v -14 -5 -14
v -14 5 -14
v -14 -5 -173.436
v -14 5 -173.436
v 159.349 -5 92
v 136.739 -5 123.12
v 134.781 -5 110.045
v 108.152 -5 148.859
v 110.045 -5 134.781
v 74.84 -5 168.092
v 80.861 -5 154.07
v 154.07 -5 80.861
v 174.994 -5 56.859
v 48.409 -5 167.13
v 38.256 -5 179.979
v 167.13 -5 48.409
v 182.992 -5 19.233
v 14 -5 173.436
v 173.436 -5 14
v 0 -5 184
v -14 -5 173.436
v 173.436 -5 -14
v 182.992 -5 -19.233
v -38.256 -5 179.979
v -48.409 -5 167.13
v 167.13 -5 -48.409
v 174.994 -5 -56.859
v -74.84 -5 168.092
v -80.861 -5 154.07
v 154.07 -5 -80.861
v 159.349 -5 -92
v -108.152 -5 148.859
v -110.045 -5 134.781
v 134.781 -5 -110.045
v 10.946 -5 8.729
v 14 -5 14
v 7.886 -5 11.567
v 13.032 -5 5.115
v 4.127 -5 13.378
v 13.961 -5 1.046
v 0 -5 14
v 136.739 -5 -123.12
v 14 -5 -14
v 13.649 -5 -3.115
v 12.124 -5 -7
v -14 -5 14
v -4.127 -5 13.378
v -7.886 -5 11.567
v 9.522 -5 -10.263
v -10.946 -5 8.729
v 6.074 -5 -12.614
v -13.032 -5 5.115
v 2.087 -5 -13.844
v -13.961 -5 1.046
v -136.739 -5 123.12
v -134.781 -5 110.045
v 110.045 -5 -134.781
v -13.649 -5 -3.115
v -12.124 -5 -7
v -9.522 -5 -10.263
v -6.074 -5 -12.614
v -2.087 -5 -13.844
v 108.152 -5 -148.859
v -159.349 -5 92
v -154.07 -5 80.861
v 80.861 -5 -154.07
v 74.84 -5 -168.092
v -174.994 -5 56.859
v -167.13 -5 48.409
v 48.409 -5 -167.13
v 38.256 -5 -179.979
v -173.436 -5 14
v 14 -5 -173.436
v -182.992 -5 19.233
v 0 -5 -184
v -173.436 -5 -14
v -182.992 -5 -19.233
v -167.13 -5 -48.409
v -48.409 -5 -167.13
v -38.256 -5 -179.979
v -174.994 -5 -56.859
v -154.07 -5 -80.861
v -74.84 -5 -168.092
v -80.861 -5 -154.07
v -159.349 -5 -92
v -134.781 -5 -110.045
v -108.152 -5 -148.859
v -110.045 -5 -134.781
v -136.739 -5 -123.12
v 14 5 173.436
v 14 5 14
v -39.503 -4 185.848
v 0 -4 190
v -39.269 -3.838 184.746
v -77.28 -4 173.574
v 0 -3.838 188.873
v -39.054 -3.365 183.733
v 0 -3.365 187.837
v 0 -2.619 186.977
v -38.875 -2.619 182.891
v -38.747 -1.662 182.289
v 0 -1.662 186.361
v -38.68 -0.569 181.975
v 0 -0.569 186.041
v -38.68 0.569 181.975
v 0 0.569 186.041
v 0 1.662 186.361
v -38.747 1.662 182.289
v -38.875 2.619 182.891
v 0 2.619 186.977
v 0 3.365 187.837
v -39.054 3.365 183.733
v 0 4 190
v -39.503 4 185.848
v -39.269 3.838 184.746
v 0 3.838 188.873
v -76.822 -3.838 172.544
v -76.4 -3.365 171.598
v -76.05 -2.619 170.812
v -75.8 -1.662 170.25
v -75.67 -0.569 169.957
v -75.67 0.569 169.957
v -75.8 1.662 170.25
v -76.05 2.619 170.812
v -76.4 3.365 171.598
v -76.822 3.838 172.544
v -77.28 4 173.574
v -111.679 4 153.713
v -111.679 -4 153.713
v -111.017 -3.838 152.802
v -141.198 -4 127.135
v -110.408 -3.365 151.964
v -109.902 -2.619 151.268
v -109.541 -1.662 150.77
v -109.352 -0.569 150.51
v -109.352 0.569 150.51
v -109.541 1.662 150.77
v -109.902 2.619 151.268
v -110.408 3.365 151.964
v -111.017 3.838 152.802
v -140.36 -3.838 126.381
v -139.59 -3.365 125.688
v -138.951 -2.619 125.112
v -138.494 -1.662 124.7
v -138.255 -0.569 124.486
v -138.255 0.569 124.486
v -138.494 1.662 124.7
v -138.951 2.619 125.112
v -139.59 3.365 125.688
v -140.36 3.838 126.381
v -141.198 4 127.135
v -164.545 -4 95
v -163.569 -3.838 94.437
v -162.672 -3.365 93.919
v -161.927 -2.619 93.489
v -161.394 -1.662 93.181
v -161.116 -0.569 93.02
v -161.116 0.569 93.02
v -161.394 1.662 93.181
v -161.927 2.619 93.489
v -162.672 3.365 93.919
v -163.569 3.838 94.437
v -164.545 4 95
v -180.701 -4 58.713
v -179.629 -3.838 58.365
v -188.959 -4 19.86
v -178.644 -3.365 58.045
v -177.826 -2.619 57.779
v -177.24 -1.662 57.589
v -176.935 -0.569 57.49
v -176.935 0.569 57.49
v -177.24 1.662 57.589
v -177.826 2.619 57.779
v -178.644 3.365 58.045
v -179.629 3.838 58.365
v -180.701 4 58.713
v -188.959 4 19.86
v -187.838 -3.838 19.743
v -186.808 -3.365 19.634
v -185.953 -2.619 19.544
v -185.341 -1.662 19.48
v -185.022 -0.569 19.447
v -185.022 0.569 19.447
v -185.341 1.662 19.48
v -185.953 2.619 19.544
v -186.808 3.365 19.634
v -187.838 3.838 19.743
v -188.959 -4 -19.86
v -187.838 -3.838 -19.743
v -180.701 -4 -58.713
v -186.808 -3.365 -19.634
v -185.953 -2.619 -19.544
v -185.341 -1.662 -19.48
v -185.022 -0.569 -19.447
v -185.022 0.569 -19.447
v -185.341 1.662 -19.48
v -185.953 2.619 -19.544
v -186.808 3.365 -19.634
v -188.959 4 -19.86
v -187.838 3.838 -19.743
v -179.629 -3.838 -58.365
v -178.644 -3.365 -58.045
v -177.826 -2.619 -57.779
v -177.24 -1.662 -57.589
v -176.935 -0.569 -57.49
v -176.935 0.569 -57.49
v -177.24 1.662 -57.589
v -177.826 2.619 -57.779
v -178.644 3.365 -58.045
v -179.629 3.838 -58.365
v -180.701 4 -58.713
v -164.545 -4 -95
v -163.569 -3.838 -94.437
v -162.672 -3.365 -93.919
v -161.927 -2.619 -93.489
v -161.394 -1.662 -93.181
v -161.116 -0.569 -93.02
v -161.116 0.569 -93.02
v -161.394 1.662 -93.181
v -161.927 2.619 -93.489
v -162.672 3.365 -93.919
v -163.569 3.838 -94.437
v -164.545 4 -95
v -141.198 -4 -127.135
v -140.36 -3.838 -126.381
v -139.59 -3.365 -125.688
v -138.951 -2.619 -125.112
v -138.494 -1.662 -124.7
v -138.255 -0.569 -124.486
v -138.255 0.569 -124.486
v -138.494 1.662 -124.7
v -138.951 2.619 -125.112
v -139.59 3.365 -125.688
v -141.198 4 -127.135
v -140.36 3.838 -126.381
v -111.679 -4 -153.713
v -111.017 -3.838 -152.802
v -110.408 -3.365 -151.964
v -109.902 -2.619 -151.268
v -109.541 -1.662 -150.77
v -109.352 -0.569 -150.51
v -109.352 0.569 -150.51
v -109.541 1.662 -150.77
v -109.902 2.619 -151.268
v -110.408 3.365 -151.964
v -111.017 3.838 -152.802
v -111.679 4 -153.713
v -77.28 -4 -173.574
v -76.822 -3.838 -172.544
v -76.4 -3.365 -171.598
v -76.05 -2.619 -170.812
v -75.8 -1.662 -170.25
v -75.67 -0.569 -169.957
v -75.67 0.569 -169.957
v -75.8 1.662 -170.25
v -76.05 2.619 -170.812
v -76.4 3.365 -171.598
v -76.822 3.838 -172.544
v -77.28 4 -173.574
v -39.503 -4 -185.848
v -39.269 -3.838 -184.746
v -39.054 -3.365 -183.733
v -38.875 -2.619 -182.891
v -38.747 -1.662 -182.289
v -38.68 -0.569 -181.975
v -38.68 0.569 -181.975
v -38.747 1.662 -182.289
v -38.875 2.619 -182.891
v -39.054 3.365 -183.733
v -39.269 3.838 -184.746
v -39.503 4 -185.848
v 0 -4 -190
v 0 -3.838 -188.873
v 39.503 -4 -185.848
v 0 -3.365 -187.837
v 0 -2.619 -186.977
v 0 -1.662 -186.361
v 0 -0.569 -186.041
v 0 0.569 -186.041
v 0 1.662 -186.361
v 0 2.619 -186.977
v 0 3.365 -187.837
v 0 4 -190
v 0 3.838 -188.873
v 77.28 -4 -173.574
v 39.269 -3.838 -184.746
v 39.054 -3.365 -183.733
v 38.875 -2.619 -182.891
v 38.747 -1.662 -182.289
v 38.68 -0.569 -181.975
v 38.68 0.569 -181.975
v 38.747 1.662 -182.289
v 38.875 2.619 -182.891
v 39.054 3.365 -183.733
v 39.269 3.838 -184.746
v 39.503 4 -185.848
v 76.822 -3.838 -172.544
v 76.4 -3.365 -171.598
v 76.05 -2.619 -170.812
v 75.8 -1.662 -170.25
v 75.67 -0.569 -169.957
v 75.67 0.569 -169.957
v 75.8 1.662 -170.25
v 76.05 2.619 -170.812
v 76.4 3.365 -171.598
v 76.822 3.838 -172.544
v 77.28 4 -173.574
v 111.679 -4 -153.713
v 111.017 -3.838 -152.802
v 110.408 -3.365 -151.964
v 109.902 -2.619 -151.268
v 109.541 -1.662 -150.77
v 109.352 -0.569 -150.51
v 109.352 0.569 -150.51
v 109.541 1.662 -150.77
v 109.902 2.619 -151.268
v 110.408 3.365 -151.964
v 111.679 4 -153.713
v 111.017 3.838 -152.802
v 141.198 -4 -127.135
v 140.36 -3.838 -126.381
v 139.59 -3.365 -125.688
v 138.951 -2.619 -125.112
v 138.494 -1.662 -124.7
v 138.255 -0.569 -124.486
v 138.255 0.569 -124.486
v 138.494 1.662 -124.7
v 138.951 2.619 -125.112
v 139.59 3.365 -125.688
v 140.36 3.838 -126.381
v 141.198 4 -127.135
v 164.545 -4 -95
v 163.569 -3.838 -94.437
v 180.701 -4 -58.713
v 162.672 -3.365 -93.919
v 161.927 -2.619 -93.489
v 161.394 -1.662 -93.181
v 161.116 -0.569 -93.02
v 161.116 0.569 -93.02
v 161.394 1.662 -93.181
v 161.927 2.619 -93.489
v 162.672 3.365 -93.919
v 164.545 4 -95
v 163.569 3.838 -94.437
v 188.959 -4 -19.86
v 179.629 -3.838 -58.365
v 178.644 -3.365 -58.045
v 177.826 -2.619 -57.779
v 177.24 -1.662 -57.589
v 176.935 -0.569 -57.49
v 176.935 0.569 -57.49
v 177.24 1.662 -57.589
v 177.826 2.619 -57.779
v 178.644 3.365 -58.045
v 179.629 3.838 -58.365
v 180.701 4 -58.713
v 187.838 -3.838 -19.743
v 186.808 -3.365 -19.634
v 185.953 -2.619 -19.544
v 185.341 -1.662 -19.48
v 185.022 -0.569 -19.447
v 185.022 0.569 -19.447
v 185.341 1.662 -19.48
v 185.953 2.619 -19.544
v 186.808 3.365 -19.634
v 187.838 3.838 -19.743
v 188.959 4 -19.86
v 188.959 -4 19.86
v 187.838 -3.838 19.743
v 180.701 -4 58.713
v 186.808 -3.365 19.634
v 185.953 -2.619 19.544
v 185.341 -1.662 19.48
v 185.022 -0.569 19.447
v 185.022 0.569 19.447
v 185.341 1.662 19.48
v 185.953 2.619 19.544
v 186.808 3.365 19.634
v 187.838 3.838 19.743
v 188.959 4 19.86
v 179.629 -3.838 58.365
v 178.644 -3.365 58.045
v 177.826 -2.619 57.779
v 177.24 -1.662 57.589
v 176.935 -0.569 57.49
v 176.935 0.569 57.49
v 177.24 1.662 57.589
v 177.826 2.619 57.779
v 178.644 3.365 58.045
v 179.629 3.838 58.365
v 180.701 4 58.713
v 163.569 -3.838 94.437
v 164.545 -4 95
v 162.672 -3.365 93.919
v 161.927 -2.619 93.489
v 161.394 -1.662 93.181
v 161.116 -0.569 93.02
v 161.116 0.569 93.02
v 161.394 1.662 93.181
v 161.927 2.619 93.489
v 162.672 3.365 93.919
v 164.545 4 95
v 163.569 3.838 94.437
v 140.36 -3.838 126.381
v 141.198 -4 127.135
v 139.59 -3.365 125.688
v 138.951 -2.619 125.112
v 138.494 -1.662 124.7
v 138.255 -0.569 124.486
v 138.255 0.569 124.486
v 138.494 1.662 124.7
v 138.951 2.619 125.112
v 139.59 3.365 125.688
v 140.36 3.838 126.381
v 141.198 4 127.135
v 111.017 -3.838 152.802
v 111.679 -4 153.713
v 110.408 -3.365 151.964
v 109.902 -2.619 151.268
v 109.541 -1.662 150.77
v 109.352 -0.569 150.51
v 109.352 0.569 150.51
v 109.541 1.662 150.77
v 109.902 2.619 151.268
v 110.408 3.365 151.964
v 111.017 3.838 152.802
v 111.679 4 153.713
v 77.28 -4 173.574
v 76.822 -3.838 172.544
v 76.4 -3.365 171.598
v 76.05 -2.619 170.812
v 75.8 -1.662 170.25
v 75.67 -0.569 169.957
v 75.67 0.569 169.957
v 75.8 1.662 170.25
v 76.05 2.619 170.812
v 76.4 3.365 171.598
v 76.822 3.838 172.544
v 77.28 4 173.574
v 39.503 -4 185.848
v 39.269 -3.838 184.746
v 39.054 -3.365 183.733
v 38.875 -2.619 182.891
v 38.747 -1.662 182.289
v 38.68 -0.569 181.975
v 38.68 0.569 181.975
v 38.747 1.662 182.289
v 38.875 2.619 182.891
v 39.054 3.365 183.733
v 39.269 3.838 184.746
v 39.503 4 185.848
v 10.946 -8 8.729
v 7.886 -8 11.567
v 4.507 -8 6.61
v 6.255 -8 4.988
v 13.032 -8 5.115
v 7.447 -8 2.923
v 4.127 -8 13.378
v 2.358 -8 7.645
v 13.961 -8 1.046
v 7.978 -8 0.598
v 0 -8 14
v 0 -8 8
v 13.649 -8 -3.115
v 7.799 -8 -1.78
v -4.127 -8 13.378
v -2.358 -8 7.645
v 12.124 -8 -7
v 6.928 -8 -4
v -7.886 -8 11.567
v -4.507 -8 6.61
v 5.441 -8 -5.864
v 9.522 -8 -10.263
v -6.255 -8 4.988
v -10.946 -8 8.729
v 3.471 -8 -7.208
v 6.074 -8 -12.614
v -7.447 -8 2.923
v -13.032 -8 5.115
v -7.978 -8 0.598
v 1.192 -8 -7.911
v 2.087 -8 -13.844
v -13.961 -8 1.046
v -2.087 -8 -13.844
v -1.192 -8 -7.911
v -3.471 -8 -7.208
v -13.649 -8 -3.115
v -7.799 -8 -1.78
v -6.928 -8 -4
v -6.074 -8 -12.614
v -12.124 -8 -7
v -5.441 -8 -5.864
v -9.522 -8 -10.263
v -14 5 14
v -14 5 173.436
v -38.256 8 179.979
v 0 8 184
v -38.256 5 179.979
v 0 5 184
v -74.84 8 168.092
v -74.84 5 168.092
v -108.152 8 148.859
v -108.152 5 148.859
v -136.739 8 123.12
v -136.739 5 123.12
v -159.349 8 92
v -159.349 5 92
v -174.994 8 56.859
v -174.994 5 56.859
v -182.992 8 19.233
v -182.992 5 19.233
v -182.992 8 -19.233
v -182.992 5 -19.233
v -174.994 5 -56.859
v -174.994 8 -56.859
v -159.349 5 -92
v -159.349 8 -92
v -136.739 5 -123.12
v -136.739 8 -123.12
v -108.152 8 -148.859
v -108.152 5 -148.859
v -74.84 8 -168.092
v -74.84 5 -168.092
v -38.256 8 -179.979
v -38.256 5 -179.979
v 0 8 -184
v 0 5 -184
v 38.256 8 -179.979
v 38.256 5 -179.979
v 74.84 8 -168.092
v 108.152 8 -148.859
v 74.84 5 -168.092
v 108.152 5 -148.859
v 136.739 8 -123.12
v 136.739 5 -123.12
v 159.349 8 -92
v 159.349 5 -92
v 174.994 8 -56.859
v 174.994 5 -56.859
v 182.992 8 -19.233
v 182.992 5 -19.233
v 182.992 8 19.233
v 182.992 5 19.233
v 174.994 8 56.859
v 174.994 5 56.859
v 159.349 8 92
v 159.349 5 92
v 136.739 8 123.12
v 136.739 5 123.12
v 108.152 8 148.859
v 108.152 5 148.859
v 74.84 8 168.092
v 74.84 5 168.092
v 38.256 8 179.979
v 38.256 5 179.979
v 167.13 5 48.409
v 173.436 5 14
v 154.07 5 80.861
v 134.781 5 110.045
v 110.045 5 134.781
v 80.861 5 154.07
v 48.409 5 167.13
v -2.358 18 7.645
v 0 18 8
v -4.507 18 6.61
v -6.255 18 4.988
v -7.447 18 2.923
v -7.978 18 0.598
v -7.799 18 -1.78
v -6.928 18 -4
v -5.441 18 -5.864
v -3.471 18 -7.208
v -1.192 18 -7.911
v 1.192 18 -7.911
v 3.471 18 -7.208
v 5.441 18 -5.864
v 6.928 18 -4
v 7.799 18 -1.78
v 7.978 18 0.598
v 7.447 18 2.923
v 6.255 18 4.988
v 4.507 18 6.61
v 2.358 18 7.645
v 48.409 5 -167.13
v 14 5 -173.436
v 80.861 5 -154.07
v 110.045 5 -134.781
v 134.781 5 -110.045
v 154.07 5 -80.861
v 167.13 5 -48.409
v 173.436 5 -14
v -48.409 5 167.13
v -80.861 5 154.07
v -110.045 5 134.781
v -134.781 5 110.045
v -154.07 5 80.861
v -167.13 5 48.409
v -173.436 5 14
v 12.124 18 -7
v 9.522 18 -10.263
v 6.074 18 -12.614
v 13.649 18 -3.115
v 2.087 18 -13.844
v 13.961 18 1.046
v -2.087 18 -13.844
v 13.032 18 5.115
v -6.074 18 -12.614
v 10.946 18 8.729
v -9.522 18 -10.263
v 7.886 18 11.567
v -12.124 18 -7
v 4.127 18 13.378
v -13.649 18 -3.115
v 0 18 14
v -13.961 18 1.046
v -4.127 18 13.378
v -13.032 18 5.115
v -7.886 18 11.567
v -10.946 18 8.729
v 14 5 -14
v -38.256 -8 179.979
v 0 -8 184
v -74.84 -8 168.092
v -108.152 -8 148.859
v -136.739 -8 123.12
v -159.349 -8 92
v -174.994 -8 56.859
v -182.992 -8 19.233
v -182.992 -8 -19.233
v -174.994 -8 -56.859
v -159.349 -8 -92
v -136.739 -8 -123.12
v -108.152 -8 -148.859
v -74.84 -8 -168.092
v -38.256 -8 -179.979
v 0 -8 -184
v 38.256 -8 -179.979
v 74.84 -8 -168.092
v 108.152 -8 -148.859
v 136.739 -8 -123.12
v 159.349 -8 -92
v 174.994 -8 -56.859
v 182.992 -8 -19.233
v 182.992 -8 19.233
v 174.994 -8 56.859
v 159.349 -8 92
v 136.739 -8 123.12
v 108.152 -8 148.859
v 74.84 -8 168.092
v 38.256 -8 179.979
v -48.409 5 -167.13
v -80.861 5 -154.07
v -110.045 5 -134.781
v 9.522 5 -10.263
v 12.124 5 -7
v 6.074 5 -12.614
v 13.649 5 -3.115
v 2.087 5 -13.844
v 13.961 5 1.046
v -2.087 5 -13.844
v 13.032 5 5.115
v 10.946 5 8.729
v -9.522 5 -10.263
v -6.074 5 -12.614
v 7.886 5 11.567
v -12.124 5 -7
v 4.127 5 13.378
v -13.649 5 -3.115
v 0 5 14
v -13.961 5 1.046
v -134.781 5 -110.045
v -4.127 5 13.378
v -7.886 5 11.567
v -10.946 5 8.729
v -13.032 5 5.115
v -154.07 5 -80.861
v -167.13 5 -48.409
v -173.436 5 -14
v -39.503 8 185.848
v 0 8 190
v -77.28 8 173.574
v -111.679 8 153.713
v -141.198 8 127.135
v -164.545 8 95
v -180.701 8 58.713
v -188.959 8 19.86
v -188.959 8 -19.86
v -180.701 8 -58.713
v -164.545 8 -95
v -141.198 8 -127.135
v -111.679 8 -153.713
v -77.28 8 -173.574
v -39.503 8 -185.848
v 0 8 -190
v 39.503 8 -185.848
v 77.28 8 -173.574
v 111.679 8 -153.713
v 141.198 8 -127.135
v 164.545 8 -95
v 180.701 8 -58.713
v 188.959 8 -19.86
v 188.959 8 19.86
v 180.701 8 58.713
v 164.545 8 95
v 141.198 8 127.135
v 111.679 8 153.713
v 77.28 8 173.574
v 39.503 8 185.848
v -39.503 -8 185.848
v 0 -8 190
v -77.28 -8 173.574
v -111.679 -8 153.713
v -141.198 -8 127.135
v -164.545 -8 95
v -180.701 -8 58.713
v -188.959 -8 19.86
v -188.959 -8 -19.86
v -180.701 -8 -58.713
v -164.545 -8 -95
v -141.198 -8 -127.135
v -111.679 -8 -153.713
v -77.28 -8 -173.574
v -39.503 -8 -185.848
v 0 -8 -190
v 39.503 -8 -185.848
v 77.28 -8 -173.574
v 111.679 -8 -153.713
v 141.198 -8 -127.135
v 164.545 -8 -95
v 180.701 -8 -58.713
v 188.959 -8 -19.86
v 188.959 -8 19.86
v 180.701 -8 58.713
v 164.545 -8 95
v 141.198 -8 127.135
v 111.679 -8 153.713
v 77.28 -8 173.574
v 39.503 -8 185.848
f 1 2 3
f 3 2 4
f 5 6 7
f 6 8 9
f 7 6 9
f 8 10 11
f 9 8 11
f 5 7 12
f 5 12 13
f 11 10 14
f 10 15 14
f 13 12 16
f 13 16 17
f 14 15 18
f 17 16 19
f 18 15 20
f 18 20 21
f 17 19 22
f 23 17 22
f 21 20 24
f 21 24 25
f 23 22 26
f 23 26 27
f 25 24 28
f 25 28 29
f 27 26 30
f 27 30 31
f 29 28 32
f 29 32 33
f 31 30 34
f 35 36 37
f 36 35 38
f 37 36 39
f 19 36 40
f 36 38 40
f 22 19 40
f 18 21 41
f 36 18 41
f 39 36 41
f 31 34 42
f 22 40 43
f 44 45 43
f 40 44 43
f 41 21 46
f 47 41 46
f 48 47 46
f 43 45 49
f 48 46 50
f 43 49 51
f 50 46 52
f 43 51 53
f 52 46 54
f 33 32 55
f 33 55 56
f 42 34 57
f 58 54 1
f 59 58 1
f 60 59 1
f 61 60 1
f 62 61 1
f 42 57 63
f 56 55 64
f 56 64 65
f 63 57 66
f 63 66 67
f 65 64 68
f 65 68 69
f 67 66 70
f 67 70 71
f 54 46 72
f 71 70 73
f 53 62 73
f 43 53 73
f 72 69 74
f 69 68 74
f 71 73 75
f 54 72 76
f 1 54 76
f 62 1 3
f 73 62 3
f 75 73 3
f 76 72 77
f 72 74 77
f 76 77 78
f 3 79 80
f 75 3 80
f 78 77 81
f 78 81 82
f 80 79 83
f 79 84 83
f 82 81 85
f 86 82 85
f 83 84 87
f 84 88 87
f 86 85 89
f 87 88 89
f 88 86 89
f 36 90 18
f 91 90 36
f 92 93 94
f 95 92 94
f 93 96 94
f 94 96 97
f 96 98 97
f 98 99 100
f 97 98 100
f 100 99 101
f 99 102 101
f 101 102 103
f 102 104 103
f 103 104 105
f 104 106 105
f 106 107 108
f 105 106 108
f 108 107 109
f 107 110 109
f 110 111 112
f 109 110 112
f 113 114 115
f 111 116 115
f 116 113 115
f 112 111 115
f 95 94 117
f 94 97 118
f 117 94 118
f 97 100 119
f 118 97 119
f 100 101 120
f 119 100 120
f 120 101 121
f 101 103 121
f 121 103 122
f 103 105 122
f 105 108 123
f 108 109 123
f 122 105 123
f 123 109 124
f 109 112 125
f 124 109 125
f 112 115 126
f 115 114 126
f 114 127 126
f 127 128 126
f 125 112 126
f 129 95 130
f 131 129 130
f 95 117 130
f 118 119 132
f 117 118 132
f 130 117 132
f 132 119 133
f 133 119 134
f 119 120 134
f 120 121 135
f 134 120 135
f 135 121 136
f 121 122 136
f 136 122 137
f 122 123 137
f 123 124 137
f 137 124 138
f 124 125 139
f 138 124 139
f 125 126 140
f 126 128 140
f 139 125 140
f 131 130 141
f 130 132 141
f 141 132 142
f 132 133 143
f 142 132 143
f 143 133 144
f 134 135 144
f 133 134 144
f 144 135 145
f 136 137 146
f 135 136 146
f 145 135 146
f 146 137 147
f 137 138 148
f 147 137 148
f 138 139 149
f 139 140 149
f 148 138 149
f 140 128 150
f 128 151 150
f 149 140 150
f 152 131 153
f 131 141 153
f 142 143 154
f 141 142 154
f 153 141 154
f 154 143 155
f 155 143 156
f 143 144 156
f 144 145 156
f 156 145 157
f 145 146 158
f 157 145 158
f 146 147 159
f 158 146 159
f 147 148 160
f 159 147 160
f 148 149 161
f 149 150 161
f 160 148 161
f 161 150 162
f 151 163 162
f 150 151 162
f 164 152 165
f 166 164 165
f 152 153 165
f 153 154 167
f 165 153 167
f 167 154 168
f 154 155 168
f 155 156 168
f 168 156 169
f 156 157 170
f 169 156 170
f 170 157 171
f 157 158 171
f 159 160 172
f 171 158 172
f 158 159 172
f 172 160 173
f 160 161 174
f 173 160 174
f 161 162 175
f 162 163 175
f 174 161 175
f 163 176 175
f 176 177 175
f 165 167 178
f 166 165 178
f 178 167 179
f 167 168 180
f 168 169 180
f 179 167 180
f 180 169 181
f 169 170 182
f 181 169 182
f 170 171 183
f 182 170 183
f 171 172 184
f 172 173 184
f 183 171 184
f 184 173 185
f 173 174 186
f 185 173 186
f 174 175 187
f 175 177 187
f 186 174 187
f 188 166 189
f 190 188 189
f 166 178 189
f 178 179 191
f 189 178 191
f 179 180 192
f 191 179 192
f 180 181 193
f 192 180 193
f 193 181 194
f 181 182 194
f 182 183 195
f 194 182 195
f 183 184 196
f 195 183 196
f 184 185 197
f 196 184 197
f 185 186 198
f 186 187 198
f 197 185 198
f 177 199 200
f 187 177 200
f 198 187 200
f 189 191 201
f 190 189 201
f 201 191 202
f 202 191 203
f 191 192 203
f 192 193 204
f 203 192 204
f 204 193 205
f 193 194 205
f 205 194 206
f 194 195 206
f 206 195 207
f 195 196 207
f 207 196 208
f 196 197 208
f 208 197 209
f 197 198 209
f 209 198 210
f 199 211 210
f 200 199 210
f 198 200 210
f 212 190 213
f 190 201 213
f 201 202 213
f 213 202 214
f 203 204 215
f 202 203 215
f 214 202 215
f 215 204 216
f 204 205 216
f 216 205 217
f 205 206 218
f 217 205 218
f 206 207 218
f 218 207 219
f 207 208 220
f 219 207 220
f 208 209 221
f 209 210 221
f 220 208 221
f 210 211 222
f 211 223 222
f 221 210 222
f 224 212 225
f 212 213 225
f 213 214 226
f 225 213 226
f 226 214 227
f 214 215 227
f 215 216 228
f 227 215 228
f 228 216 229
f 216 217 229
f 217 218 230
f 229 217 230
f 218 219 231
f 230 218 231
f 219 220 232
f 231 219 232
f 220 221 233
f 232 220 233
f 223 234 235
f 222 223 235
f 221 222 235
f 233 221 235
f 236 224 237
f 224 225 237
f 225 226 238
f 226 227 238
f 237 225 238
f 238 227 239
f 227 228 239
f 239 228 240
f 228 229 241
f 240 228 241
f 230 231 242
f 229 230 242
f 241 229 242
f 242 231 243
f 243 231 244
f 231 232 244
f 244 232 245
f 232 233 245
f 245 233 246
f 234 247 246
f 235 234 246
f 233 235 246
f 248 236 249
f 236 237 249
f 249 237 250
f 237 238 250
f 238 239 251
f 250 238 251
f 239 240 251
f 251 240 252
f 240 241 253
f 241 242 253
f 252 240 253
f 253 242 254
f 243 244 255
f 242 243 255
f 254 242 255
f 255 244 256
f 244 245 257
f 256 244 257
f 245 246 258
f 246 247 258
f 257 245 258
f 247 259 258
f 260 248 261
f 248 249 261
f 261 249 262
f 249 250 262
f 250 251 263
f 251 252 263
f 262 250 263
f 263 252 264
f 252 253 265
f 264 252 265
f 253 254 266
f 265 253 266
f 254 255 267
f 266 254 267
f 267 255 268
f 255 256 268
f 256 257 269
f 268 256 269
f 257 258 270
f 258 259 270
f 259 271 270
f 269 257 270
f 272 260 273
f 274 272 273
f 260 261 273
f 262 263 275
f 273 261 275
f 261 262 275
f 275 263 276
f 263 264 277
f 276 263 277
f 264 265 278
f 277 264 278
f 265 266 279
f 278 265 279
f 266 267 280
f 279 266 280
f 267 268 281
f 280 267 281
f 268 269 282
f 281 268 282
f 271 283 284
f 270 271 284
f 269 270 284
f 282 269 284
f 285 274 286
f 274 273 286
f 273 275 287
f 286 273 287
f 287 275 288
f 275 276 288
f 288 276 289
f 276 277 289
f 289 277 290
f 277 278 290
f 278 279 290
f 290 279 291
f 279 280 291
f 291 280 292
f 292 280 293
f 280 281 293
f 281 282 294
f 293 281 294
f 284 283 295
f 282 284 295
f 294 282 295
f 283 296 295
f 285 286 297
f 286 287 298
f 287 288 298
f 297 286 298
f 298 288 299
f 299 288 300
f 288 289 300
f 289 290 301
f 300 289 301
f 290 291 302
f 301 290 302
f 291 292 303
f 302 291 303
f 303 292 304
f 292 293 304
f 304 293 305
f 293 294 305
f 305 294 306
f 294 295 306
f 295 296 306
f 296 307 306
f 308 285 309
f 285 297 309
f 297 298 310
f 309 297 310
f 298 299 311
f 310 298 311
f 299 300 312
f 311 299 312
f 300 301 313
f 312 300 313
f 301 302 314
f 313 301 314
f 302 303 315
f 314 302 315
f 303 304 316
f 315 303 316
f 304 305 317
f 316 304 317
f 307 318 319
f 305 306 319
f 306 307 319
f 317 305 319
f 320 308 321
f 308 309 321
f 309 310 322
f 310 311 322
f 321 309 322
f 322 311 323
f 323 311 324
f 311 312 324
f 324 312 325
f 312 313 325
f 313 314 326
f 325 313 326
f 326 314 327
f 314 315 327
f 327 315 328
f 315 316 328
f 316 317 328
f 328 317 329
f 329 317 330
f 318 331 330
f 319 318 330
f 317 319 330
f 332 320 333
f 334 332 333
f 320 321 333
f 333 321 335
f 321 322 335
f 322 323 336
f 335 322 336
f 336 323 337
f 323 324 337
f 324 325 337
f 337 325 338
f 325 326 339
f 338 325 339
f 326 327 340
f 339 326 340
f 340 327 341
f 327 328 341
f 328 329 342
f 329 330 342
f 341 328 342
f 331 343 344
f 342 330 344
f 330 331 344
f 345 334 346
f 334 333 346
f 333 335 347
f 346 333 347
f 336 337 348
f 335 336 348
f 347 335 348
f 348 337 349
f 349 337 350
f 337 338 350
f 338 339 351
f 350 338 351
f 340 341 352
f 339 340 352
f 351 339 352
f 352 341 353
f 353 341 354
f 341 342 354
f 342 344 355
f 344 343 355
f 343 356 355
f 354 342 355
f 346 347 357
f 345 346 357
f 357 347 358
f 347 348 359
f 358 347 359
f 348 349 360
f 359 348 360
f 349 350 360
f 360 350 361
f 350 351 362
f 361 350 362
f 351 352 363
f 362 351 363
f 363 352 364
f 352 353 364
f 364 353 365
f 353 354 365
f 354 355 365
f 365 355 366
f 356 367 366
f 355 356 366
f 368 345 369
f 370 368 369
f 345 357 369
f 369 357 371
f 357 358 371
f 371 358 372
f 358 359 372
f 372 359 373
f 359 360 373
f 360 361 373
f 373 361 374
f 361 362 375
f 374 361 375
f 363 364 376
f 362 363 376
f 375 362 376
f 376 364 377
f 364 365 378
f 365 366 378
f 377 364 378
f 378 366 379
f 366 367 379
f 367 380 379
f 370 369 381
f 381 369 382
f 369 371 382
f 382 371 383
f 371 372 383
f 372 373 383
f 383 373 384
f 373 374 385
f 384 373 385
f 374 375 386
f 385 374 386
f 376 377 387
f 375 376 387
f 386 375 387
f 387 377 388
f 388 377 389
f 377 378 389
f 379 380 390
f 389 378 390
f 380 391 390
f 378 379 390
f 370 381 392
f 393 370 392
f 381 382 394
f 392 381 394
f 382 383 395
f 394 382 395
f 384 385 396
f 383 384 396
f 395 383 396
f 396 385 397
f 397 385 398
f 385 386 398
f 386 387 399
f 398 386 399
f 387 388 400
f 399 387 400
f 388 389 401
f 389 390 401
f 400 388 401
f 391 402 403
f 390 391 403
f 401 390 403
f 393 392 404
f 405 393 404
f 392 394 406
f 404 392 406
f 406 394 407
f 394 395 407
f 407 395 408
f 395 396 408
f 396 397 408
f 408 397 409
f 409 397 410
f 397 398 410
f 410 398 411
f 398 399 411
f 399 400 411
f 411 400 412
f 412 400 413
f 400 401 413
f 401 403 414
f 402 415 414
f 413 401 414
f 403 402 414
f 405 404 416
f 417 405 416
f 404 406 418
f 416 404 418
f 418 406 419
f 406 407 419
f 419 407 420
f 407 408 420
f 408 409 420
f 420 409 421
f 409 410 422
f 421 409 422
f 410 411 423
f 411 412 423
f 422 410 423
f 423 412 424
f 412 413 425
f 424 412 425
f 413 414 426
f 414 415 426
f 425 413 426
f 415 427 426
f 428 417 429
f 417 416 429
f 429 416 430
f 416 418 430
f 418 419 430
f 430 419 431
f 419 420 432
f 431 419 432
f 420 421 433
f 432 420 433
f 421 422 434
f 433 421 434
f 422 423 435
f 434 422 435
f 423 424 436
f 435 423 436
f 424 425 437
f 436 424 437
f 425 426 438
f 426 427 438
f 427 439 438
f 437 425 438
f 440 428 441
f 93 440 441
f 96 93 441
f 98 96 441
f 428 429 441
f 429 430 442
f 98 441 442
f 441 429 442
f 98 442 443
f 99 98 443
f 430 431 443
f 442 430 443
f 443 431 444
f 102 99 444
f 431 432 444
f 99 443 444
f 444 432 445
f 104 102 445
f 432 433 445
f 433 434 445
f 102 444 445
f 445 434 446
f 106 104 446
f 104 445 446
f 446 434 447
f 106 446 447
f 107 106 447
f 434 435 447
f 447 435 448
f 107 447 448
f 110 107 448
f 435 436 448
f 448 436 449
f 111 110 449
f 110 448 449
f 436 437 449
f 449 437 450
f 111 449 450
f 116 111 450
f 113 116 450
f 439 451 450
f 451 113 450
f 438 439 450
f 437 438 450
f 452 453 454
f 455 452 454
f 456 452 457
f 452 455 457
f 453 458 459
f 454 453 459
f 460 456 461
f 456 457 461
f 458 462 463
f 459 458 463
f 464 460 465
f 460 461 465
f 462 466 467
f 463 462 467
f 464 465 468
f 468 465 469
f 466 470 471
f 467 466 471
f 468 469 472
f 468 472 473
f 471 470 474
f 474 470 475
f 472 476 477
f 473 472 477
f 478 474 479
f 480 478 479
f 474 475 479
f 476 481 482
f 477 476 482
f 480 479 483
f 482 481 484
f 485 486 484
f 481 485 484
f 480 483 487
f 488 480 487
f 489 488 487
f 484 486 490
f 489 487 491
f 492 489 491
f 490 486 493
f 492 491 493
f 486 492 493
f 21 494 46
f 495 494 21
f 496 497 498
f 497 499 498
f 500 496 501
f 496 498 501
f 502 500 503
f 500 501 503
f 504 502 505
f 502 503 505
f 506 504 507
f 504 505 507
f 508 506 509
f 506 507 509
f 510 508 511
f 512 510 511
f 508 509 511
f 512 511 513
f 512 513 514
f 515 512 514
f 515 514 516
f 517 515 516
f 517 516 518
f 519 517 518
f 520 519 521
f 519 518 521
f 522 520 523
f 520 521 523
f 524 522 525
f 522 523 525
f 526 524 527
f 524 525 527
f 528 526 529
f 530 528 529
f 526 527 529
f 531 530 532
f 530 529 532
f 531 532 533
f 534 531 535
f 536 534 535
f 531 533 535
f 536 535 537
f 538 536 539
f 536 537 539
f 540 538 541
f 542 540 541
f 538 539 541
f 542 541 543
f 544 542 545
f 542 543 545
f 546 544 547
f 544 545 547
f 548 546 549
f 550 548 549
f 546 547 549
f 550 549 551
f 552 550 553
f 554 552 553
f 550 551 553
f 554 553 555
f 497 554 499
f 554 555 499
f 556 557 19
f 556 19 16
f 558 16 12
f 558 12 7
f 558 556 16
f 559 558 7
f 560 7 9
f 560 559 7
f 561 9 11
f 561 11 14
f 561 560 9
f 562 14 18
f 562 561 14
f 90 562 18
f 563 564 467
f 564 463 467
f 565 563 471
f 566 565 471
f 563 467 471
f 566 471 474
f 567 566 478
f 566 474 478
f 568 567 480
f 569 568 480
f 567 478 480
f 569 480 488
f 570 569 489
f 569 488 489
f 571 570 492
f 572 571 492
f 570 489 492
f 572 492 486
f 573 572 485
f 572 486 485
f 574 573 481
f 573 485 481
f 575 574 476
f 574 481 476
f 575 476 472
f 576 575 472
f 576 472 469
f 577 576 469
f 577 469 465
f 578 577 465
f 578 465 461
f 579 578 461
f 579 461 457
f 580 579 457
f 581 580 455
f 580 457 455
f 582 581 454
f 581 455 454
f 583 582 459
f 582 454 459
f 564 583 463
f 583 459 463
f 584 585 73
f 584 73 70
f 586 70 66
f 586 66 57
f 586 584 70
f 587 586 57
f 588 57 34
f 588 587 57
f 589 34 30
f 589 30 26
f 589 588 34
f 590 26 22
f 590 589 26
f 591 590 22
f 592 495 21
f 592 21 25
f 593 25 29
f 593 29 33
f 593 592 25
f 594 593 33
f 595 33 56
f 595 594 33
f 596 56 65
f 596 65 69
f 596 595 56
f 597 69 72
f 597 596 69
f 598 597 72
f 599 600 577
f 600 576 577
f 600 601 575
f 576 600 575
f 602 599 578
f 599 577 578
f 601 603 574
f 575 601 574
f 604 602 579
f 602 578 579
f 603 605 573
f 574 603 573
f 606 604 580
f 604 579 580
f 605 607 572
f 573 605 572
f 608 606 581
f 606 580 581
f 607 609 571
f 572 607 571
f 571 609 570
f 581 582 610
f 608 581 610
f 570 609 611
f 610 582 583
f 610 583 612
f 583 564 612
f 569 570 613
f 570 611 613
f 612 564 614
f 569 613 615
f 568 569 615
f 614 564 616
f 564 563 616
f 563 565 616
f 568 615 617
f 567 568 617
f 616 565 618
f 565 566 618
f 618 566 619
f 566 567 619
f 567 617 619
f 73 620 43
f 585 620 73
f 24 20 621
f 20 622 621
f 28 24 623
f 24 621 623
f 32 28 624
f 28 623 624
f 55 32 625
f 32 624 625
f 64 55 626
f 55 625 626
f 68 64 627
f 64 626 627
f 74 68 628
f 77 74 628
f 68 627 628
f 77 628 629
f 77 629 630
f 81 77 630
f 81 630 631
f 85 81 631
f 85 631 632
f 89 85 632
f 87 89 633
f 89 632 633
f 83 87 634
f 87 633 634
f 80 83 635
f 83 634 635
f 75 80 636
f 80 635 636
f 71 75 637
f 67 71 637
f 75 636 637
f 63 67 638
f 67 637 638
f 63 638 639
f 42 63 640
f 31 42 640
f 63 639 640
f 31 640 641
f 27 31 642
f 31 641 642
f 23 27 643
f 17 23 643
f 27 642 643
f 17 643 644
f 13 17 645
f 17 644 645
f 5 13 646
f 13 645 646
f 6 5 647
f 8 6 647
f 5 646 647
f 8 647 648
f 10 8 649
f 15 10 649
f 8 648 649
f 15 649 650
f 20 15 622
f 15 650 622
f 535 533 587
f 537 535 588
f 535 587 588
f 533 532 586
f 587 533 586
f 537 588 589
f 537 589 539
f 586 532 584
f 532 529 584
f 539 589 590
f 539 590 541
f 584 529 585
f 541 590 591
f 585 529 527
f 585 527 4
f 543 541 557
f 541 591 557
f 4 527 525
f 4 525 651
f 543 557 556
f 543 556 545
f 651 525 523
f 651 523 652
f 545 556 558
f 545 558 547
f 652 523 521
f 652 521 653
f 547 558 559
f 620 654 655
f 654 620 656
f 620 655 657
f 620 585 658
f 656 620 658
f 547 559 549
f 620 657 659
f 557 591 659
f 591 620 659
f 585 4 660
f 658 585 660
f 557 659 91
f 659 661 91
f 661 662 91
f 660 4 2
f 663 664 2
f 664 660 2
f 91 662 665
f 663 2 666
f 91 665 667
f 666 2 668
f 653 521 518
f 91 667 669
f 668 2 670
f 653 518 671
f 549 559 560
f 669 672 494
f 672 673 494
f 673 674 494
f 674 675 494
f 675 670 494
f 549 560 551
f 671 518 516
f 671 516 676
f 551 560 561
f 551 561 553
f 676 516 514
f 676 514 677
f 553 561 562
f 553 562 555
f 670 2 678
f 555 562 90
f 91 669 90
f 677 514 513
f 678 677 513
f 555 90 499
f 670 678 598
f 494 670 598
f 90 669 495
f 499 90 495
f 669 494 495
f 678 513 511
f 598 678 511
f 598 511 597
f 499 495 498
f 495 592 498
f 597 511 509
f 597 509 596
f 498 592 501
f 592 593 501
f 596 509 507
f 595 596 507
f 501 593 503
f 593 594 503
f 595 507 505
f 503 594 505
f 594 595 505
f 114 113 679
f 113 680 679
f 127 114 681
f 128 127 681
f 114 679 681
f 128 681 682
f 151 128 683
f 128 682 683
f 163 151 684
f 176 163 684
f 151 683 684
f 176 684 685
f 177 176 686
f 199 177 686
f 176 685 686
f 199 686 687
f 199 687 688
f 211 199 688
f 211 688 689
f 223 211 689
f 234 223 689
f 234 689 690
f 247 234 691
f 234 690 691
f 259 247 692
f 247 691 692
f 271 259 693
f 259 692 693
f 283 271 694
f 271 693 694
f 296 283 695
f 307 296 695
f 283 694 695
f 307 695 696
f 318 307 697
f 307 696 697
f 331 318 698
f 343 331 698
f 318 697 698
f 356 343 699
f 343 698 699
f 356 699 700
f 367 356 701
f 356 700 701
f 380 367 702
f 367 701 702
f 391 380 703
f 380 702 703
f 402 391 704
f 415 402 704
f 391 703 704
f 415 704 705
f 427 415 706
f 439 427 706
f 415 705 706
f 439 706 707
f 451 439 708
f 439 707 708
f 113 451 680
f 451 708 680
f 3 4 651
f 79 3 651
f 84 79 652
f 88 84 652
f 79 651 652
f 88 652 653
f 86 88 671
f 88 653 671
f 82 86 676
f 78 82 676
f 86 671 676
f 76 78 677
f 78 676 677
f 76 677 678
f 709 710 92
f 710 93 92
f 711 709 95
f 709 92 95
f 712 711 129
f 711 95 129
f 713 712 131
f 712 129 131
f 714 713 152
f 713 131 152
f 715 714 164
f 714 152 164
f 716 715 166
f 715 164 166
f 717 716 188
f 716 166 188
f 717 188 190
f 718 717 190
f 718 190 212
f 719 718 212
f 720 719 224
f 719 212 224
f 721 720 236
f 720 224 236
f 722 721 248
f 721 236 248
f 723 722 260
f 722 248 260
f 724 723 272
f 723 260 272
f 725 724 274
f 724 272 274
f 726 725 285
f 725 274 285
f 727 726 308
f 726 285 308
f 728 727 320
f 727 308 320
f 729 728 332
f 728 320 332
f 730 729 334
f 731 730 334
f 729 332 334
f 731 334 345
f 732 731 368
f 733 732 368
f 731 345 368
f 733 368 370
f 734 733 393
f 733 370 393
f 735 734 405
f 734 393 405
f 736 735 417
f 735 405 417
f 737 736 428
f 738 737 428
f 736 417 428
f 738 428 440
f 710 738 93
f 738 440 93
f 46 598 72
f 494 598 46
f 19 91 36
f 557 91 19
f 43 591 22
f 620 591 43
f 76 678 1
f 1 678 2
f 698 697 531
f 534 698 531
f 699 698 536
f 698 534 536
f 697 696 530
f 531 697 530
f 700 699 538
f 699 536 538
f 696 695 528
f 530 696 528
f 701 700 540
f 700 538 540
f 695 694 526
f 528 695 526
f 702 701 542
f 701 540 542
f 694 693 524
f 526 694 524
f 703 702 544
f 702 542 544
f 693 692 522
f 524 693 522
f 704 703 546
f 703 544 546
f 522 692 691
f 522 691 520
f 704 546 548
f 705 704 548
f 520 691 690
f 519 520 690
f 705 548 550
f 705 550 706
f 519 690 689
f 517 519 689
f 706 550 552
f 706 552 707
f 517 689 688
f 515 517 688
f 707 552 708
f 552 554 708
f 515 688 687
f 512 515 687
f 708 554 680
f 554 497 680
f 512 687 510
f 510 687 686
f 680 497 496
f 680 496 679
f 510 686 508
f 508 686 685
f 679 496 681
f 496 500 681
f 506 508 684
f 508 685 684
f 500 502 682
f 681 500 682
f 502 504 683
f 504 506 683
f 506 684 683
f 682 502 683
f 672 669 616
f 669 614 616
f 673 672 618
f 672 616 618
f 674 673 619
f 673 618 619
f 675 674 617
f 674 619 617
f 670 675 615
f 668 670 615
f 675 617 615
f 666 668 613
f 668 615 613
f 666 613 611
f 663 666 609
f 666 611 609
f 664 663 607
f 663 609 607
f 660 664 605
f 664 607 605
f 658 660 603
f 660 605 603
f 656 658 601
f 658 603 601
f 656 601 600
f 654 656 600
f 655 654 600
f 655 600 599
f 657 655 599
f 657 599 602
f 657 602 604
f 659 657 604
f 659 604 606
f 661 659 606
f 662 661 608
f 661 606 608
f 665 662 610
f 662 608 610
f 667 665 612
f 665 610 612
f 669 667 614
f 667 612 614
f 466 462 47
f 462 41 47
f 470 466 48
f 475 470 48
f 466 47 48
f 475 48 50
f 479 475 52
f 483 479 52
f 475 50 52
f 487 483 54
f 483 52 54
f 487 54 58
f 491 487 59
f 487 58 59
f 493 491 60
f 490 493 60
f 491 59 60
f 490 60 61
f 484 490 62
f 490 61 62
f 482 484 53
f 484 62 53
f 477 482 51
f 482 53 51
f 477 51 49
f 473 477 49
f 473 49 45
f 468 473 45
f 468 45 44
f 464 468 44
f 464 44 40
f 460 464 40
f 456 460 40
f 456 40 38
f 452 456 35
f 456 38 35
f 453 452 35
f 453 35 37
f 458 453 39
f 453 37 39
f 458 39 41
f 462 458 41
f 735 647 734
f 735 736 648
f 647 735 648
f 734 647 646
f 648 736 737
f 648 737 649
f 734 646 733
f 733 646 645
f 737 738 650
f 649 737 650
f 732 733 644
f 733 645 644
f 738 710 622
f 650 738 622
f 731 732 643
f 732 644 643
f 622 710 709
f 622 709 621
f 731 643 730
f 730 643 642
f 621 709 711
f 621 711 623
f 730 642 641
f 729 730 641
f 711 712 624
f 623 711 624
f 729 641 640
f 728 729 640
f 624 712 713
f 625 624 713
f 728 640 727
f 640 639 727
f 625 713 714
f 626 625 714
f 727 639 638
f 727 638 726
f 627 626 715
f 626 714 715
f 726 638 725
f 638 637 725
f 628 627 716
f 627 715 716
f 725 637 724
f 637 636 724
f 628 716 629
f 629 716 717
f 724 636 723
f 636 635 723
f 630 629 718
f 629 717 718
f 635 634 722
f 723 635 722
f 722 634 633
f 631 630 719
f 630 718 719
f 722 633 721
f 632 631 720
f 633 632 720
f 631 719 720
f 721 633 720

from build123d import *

# Parameters (mm, degrees)
CUT_EXTRUDE1_DEPTH = 10


with BuildPart() as part:
    # Sketch1 → Revolve2 (revolve)
    with BuildSketch(Plane.XY, mode=Mode.PRIVATE) as revolve2_sk:
        with BuildLine():
            Line((8, 8), (8, -8))
            Line((8, -8), (14, -8))
            Line((14, -8), (14, -5))
            Line((14, -5), (184, -5))
            Line((184, -5), (184, -8))
            Line((184, -8), (190, -8))
            Line((190, -8), (190, -4))
            ThreePointArc((190, -4), (186, 0), (190, 4))
            Line((190, 4), (190, 8))
            Line((190, 8), (184, 8))
            Line((184, 8), (184, 5))
            Line((184, 5), (14, 5))
            Line((14, 5), (14, 8))
            Line((14, 8), (14, 18))
            Line((14, 18), (8, 18))
            Line((8, 18), (8, 8))
        make_face()
    revolve(revolve2_sk.sketch.rotate(Axis((0, 60.317614973, 0), (0, -1, 0)), 90), axis=Axis((0, 60.317614973, 0), (0, -1, 0)))

    # Sketch2 → Cut-Extrude1 (cut)
    with BuildSketch(Plane(origin=(0, 5, 0), x_dir=(1, 0, 0), z_dir=(0, 1, 0))):
        with BuildLine():
            Line((14, 14), (14, 173.435867109))
            ThreePointArc((14, 173.435867109), (123.036579926, 123.036579926), (173.435867109, 14))
            Line((173.435867109, 14), (14, 14))
        make_face()
        with BuildLine():
            Line((-173.435867109, -14), (-14, -14))
            Line((-14, -14), (-14, -173.435867109))
            ThreePointArc((-14, -173.435867109), (-123.036579926, -123.036579926), (-173.435867109, -14))
        make_face()
        with BuildLine():
            Line((-14, 14), (-14, 173.435867109))
            ThreePointArc((-14, 173.435867109), (-123.036579926, 123.036579926), (-173.435867109, 14))
            Line((-173.435867109, 14), (-14, 14))
        make_face()
        with BuildLine():
            Line((14, -14), (173.435867109, -14))
            ThreePointArc((173.435867109, -14), (123.036579926, -123.036579926), (14, -173.435867109))
            Line((14, -173.435867109), (14, -14))
        make_face()
    extrude(amount=-CUT_EXTRUDE1_DEPTH, mode=Mode.SUBTRACT)


solid = part.part
